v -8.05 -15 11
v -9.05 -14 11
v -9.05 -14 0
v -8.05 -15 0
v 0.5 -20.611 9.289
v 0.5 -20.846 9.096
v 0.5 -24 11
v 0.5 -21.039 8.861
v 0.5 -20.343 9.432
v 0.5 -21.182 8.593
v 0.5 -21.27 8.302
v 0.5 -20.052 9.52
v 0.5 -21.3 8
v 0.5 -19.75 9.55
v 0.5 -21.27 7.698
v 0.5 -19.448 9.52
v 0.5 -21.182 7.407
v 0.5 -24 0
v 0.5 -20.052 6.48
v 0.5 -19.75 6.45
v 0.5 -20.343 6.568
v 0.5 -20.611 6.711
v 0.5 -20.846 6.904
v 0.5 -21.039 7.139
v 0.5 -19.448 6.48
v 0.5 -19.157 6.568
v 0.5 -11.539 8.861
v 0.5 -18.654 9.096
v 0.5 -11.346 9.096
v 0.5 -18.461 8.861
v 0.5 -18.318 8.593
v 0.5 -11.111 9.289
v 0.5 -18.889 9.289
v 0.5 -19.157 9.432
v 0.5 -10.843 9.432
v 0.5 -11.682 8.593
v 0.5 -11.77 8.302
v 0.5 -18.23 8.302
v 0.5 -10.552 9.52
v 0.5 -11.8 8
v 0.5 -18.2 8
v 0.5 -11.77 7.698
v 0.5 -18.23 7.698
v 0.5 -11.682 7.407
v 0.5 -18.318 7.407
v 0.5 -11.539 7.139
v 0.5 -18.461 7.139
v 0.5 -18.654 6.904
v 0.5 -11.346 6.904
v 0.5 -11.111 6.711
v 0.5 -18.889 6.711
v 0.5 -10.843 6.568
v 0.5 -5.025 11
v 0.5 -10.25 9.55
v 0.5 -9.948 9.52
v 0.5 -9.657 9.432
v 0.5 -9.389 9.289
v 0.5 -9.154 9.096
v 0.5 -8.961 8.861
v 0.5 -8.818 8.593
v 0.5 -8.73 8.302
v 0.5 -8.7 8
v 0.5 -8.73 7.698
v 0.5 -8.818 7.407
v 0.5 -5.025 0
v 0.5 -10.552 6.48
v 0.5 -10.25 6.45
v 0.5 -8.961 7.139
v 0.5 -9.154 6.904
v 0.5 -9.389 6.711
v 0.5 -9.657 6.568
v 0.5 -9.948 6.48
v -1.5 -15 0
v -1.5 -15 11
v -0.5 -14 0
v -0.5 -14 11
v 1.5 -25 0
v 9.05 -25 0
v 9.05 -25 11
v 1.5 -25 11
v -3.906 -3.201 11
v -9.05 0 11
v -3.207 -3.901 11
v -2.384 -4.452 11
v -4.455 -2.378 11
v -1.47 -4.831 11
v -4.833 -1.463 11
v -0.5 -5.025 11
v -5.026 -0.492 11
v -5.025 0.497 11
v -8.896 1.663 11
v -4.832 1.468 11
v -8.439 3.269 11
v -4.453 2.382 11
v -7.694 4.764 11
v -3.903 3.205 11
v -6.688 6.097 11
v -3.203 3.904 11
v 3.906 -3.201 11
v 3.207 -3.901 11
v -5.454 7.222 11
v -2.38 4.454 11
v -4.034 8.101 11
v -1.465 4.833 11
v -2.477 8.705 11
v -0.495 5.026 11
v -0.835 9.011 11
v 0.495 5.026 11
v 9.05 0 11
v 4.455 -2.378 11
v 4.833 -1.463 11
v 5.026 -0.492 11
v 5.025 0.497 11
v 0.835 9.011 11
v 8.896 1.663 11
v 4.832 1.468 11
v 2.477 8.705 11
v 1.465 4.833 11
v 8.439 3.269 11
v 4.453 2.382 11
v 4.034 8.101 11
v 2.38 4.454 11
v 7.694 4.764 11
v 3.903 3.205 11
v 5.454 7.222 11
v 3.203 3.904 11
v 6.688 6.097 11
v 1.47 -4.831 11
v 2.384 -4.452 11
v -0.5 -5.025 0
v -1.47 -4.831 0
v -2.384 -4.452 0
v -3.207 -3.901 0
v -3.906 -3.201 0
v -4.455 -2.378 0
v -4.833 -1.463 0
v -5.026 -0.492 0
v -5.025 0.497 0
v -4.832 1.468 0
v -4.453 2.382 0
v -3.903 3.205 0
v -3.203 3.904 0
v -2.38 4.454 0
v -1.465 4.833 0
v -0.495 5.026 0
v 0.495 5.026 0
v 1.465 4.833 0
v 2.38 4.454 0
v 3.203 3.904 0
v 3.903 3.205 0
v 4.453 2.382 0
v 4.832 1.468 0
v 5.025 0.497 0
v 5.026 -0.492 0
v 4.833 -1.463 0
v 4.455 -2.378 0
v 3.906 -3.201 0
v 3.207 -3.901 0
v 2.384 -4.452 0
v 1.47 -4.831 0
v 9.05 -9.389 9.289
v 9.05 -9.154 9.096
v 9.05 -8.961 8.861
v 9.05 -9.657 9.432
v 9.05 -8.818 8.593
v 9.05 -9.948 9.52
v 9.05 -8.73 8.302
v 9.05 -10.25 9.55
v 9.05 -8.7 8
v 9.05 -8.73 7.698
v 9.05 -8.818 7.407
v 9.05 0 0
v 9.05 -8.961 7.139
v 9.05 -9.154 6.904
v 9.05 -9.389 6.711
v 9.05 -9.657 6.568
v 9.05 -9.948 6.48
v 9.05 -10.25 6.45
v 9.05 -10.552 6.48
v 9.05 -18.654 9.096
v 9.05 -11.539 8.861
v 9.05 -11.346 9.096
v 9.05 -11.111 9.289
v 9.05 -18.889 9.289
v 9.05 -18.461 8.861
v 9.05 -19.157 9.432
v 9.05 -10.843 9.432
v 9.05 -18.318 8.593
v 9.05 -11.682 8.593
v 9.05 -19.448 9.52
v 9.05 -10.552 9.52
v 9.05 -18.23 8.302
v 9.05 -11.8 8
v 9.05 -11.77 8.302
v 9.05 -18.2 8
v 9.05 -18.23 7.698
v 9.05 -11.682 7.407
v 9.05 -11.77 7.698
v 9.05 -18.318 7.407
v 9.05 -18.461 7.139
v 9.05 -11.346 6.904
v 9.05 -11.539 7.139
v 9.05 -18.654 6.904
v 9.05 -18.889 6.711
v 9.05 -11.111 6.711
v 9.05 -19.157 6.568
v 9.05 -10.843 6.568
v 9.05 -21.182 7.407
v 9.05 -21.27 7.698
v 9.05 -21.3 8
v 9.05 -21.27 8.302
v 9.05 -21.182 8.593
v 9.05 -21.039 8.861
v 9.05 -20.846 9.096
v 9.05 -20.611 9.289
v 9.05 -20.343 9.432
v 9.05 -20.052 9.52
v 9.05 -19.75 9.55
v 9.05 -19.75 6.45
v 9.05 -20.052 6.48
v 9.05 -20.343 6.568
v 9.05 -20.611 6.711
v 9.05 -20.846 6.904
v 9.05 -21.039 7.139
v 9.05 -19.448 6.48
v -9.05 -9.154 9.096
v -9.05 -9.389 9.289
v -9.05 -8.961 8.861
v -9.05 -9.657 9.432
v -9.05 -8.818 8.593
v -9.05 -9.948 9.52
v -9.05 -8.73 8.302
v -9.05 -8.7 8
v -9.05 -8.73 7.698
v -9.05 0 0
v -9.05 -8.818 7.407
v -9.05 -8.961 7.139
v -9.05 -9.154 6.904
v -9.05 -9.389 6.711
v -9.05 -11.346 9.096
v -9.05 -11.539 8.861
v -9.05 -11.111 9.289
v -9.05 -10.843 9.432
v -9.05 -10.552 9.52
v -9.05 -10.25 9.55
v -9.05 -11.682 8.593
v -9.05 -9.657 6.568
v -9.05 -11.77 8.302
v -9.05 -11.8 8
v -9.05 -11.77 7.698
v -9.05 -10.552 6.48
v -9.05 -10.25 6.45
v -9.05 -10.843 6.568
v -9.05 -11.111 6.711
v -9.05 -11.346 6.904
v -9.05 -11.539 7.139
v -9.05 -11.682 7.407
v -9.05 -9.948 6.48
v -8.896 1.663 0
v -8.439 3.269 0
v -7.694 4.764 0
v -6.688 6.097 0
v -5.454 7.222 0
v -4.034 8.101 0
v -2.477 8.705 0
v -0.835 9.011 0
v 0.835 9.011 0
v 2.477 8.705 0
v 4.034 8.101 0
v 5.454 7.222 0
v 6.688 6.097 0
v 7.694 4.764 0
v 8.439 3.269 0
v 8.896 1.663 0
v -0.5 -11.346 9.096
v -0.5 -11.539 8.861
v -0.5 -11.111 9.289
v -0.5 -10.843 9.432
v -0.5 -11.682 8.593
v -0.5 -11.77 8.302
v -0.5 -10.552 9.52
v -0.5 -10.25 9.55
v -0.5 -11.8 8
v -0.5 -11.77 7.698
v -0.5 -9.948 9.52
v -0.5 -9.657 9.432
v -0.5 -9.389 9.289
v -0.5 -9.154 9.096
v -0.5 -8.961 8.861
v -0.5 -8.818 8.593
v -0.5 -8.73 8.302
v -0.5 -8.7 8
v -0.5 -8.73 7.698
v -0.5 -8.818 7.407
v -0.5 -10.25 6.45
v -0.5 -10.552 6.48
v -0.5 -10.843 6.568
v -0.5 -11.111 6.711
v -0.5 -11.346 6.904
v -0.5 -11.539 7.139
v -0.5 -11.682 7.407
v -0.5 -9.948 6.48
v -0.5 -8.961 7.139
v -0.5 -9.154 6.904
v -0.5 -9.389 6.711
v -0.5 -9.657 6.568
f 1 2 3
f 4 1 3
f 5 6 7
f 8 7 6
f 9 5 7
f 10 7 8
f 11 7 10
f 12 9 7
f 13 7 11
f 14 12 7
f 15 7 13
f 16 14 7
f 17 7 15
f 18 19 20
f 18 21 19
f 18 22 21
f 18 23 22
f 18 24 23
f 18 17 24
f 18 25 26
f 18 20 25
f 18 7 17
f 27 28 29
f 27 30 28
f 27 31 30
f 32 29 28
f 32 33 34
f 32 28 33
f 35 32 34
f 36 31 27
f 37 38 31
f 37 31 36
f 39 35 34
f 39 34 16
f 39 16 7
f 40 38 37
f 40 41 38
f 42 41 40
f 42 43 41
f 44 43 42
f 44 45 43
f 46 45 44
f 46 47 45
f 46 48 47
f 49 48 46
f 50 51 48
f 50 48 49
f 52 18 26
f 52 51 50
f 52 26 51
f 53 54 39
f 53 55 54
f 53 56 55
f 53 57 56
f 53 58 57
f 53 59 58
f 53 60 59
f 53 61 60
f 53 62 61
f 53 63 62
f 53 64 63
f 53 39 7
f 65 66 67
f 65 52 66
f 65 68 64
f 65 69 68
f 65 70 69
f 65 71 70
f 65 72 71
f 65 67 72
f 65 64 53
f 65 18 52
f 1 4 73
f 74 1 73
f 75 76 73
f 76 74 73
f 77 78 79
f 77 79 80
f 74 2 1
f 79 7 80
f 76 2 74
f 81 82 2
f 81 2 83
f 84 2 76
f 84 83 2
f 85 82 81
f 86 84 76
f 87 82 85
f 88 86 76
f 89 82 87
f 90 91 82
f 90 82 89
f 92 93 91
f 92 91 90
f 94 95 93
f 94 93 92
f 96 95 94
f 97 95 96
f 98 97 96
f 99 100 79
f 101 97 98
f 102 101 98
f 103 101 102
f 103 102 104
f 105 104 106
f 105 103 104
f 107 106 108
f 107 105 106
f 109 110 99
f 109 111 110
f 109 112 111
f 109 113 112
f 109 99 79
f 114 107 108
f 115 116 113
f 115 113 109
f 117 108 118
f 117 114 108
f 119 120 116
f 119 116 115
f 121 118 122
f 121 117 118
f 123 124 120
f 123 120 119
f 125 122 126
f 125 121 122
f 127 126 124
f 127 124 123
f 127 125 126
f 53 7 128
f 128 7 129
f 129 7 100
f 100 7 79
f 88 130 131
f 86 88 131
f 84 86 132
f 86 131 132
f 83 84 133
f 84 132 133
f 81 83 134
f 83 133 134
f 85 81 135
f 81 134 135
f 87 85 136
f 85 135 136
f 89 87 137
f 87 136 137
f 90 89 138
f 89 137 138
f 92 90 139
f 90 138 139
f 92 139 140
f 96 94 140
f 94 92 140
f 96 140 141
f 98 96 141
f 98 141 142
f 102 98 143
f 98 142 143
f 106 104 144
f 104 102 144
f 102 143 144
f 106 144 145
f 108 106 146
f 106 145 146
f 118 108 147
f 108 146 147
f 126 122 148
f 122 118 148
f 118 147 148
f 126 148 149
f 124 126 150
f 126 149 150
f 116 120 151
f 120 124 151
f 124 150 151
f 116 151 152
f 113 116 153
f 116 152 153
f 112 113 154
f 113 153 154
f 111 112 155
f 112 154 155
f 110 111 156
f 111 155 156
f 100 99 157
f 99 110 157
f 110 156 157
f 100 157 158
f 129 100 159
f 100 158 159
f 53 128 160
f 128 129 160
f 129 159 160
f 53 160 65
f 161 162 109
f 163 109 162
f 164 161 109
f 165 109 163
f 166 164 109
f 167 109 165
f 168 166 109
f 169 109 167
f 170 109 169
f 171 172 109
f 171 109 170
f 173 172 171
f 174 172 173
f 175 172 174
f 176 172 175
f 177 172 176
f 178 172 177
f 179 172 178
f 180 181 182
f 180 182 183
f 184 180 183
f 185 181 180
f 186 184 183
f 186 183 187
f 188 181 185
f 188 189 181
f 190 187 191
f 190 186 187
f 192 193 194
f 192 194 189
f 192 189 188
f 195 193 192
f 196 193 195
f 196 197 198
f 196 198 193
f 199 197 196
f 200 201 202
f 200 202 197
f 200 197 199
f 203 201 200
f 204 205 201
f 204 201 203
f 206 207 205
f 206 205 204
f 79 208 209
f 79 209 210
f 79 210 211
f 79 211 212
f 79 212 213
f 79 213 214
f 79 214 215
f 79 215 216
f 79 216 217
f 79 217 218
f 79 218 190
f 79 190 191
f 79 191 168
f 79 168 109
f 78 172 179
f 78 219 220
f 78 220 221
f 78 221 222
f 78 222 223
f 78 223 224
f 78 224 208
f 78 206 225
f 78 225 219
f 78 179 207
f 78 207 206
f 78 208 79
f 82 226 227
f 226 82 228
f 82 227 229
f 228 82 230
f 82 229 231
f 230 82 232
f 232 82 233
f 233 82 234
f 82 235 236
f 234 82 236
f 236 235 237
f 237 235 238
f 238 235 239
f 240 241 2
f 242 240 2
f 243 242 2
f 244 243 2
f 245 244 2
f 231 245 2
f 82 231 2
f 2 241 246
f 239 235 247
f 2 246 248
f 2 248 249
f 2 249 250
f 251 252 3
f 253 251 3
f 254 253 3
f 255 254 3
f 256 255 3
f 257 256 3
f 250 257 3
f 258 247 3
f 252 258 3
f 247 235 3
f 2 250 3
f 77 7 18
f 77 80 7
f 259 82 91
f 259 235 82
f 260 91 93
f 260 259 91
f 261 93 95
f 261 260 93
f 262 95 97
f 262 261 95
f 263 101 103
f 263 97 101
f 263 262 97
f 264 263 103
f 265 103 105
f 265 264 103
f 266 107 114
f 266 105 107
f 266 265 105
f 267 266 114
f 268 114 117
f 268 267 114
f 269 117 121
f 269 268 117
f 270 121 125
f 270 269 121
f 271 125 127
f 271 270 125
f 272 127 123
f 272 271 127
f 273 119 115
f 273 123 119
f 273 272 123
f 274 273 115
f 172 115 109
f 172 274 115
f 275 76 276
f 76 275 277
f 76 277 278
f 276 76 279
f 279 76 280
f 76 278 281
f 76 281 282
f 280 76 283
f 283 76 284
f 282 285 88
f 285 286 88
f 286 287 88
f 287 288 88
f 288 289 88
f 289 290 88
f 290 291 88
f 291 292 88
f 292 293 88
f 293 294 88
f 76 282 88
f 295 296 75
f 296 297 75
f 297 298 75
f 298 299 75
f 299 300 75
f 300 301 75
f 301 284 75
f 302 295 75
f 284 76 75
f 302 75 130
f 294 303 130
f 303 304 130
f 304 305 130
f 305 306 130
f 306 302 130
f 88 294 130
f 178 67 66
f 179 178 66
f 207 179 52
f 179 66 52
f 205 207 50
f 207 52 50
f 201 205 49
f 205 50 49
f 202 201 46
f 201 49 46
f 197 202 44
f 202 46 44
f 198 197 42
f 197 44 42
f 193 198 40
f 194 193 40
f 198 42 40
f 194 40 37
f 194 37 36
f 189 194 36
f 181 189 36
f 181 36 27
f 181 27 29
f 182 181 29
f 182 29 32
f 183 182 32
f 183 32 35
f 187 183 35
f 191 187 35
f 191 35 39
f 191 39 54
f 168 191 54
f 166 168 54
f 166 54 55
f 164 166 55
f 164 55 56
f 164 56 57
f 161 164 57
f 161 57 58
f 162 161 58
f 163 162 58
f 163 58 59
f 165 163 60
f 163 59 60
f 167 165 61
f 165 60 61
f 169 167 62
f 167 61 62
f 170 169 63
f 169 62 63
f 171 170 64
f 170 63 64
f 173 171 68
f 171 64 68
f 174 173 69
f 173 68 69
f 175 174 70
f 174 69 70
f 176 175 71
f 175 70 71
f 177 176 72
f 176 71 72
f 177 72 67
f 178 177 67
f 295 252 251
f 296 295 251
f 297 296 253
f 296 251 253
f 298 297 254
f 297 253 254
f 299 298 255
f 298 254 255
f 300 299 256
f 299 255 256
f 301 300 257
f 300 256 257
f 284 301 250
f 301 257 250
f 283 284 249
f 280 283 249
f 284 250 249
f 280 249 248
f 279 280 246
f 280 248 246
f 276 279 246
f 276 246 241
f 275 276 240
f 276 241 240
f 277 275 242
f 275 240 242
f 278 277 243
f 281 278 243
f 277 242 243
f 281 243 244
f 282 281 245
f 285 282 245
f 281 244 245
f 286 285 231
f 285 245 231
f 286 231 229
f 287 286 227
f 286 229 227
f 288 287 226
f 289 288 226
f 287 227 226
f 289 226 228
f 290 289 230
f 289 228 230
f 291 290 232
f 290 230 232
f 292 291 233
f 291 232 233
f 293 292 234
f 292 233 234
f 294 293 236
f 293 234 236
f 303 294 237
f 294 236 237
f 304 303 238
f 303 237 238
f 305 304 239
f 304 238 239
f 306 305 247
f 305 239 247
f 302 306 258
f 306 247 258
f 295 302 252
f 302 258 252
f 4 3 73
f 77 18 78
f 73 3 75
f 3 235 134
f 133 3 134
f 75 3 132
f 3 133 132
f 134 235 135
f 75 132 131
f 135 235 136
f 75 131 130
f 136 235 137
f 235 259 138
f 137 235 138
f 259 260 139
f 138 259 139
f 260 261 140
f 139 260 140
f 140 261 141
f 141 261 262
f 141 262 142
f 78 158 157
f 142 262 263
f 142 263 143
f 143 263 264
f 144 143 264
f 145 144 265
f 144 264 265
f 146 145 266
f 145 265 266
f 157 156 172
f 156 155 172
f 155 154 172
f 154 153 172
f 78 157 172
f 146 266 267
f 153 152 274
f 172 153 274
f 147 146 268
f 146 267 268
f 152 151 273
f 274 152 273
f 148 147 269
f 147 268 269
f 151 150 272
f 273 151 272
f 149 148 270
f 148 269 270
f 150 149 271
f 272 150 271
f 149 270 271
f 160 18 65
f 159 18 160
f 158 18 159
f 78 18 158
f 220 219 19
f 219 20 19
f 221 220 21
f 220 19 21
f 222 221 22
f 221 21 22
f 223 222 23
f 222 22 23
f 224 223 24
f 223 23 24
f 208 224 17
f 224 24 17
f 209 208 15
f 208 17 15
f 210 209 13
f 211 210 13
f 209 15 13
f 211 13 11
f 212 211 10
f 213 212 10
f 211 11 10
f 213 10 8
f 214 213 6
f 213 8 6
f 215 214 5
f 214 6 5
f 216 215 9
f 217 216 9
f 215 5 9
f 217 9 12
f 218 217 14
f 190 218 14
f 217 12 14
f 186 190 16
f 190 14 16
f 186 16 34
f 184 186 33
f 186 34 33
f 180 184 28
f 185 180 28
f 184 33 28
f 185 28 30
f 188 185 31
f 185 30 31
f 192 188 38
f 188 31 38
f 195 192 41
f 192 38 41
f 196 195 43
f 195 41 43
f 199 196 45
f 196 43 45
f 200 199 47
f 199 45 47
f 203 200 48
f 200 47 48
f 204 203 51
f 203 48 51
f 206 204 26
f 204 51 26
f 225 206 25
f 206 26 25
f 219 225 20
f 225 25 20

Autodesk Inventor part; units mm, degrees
ref_plane "YZ Plane" through (0, 0, 0) normal (1, 0, 0) x (0, 1, 0)
ref_plane "XZ Plane" through (0, 0, 0) normal (0, 1, 0) x (-1, 0, 0)
ref_plane "XY Plane" through (0, 0, 0) normal (0, 0, 1) x (1, 0, 0)
sketch "Szkic1" plane through (0, 0, 0) normal (0, 0, 1) x (1, 0, 0)
  arc A0 (0.5, -5.0252) -> (-0.5, -5.0252) centre (0, 0) ccw
  arc A1 (0.5, -9.0362) -> (-0.5, -9.0362) centre (0, 0) ccw
  line L0 (-9.05, 0) -> (-9.05, -25)
  line L1 (-9.05, -25) -> (-0.5, -25)
  line L2 (9.05, 0) -> (9.05, -25)
  line L3 (9.05, -25) -> (0.5, -25)
  line L4 (-0.5, -25) -> (-0.5, -5.0252)
  line L5 (0.5, -25) -> (0.5, -5.0252)
  dimension "d0" = 10.1
  dimension "d1" = 4
  dimension "d2" = 8.55
  dimension "d3" = 8.55
  dimension "d4" = 25
  dimension "d5" = 25
  dimension "d7" = 1
extrude "Wyciągnięcie proste1" add sketch "Szkic1" along normal blind 11
sketch "Szkic2" plane through (9.05, -25, 0) normal (1, 0, 0) x (0, 0, -1)
  line L0 (0, 0) -> (0, 25) projected
  line L1 (0, 25) -> (-11, 25) projected
  line L2 (-11, 0) -> (-11, 25) projected
  line L3 (0, 0) -> (-11, 0) projected
  line L4 (0, 20) -> (-11, 20)
  line L5 (-11, 25) -> (-11, 0) projected
  point P0 (-8, 5.25)
  point P1 (-8, 14.75)
  dimension "d10" = 5.25
  dimension "d11" = 20
  dimension "d12" = 5.25
  dimension "d13" = 11
  dimension "d14" = 3
  dimension "d15" = 3
hole "Otwór1" at (9.05, -19.75, 8) at (9.05, -10.25, 8) direction (-1, 0, 0) diameter 3.1 end through all
sketch "Szkic3" plane through (-9.05, -25, 0) normal (0, -1, 0) x (1, 0, 0)
  line L0 (0, 0) -> (8.55, 0) projected
  line L1 (8.55, 0) -> (8.55, 11) projected
  line L2 (0, 11) -> (8.55, 11) projected
  line L3 (0, 0) -> (0, 11) projected
  point P0 (9.05, 0)
extrude "Wyciągnięcie proste2" cut sketch "Szkic3" against normal blind 10
chamfer "Faza1" distance 1 angle 45 3 edges at (-9.05, -15, 5.5) (-0.5, -15, 5.5) (0.5, -25, 5.5)
equation "\"d3\" = d2"
equation "\"d4\" = d5"
properties part number "3DP_ABS_X_Axis_Endstop_Mount"
